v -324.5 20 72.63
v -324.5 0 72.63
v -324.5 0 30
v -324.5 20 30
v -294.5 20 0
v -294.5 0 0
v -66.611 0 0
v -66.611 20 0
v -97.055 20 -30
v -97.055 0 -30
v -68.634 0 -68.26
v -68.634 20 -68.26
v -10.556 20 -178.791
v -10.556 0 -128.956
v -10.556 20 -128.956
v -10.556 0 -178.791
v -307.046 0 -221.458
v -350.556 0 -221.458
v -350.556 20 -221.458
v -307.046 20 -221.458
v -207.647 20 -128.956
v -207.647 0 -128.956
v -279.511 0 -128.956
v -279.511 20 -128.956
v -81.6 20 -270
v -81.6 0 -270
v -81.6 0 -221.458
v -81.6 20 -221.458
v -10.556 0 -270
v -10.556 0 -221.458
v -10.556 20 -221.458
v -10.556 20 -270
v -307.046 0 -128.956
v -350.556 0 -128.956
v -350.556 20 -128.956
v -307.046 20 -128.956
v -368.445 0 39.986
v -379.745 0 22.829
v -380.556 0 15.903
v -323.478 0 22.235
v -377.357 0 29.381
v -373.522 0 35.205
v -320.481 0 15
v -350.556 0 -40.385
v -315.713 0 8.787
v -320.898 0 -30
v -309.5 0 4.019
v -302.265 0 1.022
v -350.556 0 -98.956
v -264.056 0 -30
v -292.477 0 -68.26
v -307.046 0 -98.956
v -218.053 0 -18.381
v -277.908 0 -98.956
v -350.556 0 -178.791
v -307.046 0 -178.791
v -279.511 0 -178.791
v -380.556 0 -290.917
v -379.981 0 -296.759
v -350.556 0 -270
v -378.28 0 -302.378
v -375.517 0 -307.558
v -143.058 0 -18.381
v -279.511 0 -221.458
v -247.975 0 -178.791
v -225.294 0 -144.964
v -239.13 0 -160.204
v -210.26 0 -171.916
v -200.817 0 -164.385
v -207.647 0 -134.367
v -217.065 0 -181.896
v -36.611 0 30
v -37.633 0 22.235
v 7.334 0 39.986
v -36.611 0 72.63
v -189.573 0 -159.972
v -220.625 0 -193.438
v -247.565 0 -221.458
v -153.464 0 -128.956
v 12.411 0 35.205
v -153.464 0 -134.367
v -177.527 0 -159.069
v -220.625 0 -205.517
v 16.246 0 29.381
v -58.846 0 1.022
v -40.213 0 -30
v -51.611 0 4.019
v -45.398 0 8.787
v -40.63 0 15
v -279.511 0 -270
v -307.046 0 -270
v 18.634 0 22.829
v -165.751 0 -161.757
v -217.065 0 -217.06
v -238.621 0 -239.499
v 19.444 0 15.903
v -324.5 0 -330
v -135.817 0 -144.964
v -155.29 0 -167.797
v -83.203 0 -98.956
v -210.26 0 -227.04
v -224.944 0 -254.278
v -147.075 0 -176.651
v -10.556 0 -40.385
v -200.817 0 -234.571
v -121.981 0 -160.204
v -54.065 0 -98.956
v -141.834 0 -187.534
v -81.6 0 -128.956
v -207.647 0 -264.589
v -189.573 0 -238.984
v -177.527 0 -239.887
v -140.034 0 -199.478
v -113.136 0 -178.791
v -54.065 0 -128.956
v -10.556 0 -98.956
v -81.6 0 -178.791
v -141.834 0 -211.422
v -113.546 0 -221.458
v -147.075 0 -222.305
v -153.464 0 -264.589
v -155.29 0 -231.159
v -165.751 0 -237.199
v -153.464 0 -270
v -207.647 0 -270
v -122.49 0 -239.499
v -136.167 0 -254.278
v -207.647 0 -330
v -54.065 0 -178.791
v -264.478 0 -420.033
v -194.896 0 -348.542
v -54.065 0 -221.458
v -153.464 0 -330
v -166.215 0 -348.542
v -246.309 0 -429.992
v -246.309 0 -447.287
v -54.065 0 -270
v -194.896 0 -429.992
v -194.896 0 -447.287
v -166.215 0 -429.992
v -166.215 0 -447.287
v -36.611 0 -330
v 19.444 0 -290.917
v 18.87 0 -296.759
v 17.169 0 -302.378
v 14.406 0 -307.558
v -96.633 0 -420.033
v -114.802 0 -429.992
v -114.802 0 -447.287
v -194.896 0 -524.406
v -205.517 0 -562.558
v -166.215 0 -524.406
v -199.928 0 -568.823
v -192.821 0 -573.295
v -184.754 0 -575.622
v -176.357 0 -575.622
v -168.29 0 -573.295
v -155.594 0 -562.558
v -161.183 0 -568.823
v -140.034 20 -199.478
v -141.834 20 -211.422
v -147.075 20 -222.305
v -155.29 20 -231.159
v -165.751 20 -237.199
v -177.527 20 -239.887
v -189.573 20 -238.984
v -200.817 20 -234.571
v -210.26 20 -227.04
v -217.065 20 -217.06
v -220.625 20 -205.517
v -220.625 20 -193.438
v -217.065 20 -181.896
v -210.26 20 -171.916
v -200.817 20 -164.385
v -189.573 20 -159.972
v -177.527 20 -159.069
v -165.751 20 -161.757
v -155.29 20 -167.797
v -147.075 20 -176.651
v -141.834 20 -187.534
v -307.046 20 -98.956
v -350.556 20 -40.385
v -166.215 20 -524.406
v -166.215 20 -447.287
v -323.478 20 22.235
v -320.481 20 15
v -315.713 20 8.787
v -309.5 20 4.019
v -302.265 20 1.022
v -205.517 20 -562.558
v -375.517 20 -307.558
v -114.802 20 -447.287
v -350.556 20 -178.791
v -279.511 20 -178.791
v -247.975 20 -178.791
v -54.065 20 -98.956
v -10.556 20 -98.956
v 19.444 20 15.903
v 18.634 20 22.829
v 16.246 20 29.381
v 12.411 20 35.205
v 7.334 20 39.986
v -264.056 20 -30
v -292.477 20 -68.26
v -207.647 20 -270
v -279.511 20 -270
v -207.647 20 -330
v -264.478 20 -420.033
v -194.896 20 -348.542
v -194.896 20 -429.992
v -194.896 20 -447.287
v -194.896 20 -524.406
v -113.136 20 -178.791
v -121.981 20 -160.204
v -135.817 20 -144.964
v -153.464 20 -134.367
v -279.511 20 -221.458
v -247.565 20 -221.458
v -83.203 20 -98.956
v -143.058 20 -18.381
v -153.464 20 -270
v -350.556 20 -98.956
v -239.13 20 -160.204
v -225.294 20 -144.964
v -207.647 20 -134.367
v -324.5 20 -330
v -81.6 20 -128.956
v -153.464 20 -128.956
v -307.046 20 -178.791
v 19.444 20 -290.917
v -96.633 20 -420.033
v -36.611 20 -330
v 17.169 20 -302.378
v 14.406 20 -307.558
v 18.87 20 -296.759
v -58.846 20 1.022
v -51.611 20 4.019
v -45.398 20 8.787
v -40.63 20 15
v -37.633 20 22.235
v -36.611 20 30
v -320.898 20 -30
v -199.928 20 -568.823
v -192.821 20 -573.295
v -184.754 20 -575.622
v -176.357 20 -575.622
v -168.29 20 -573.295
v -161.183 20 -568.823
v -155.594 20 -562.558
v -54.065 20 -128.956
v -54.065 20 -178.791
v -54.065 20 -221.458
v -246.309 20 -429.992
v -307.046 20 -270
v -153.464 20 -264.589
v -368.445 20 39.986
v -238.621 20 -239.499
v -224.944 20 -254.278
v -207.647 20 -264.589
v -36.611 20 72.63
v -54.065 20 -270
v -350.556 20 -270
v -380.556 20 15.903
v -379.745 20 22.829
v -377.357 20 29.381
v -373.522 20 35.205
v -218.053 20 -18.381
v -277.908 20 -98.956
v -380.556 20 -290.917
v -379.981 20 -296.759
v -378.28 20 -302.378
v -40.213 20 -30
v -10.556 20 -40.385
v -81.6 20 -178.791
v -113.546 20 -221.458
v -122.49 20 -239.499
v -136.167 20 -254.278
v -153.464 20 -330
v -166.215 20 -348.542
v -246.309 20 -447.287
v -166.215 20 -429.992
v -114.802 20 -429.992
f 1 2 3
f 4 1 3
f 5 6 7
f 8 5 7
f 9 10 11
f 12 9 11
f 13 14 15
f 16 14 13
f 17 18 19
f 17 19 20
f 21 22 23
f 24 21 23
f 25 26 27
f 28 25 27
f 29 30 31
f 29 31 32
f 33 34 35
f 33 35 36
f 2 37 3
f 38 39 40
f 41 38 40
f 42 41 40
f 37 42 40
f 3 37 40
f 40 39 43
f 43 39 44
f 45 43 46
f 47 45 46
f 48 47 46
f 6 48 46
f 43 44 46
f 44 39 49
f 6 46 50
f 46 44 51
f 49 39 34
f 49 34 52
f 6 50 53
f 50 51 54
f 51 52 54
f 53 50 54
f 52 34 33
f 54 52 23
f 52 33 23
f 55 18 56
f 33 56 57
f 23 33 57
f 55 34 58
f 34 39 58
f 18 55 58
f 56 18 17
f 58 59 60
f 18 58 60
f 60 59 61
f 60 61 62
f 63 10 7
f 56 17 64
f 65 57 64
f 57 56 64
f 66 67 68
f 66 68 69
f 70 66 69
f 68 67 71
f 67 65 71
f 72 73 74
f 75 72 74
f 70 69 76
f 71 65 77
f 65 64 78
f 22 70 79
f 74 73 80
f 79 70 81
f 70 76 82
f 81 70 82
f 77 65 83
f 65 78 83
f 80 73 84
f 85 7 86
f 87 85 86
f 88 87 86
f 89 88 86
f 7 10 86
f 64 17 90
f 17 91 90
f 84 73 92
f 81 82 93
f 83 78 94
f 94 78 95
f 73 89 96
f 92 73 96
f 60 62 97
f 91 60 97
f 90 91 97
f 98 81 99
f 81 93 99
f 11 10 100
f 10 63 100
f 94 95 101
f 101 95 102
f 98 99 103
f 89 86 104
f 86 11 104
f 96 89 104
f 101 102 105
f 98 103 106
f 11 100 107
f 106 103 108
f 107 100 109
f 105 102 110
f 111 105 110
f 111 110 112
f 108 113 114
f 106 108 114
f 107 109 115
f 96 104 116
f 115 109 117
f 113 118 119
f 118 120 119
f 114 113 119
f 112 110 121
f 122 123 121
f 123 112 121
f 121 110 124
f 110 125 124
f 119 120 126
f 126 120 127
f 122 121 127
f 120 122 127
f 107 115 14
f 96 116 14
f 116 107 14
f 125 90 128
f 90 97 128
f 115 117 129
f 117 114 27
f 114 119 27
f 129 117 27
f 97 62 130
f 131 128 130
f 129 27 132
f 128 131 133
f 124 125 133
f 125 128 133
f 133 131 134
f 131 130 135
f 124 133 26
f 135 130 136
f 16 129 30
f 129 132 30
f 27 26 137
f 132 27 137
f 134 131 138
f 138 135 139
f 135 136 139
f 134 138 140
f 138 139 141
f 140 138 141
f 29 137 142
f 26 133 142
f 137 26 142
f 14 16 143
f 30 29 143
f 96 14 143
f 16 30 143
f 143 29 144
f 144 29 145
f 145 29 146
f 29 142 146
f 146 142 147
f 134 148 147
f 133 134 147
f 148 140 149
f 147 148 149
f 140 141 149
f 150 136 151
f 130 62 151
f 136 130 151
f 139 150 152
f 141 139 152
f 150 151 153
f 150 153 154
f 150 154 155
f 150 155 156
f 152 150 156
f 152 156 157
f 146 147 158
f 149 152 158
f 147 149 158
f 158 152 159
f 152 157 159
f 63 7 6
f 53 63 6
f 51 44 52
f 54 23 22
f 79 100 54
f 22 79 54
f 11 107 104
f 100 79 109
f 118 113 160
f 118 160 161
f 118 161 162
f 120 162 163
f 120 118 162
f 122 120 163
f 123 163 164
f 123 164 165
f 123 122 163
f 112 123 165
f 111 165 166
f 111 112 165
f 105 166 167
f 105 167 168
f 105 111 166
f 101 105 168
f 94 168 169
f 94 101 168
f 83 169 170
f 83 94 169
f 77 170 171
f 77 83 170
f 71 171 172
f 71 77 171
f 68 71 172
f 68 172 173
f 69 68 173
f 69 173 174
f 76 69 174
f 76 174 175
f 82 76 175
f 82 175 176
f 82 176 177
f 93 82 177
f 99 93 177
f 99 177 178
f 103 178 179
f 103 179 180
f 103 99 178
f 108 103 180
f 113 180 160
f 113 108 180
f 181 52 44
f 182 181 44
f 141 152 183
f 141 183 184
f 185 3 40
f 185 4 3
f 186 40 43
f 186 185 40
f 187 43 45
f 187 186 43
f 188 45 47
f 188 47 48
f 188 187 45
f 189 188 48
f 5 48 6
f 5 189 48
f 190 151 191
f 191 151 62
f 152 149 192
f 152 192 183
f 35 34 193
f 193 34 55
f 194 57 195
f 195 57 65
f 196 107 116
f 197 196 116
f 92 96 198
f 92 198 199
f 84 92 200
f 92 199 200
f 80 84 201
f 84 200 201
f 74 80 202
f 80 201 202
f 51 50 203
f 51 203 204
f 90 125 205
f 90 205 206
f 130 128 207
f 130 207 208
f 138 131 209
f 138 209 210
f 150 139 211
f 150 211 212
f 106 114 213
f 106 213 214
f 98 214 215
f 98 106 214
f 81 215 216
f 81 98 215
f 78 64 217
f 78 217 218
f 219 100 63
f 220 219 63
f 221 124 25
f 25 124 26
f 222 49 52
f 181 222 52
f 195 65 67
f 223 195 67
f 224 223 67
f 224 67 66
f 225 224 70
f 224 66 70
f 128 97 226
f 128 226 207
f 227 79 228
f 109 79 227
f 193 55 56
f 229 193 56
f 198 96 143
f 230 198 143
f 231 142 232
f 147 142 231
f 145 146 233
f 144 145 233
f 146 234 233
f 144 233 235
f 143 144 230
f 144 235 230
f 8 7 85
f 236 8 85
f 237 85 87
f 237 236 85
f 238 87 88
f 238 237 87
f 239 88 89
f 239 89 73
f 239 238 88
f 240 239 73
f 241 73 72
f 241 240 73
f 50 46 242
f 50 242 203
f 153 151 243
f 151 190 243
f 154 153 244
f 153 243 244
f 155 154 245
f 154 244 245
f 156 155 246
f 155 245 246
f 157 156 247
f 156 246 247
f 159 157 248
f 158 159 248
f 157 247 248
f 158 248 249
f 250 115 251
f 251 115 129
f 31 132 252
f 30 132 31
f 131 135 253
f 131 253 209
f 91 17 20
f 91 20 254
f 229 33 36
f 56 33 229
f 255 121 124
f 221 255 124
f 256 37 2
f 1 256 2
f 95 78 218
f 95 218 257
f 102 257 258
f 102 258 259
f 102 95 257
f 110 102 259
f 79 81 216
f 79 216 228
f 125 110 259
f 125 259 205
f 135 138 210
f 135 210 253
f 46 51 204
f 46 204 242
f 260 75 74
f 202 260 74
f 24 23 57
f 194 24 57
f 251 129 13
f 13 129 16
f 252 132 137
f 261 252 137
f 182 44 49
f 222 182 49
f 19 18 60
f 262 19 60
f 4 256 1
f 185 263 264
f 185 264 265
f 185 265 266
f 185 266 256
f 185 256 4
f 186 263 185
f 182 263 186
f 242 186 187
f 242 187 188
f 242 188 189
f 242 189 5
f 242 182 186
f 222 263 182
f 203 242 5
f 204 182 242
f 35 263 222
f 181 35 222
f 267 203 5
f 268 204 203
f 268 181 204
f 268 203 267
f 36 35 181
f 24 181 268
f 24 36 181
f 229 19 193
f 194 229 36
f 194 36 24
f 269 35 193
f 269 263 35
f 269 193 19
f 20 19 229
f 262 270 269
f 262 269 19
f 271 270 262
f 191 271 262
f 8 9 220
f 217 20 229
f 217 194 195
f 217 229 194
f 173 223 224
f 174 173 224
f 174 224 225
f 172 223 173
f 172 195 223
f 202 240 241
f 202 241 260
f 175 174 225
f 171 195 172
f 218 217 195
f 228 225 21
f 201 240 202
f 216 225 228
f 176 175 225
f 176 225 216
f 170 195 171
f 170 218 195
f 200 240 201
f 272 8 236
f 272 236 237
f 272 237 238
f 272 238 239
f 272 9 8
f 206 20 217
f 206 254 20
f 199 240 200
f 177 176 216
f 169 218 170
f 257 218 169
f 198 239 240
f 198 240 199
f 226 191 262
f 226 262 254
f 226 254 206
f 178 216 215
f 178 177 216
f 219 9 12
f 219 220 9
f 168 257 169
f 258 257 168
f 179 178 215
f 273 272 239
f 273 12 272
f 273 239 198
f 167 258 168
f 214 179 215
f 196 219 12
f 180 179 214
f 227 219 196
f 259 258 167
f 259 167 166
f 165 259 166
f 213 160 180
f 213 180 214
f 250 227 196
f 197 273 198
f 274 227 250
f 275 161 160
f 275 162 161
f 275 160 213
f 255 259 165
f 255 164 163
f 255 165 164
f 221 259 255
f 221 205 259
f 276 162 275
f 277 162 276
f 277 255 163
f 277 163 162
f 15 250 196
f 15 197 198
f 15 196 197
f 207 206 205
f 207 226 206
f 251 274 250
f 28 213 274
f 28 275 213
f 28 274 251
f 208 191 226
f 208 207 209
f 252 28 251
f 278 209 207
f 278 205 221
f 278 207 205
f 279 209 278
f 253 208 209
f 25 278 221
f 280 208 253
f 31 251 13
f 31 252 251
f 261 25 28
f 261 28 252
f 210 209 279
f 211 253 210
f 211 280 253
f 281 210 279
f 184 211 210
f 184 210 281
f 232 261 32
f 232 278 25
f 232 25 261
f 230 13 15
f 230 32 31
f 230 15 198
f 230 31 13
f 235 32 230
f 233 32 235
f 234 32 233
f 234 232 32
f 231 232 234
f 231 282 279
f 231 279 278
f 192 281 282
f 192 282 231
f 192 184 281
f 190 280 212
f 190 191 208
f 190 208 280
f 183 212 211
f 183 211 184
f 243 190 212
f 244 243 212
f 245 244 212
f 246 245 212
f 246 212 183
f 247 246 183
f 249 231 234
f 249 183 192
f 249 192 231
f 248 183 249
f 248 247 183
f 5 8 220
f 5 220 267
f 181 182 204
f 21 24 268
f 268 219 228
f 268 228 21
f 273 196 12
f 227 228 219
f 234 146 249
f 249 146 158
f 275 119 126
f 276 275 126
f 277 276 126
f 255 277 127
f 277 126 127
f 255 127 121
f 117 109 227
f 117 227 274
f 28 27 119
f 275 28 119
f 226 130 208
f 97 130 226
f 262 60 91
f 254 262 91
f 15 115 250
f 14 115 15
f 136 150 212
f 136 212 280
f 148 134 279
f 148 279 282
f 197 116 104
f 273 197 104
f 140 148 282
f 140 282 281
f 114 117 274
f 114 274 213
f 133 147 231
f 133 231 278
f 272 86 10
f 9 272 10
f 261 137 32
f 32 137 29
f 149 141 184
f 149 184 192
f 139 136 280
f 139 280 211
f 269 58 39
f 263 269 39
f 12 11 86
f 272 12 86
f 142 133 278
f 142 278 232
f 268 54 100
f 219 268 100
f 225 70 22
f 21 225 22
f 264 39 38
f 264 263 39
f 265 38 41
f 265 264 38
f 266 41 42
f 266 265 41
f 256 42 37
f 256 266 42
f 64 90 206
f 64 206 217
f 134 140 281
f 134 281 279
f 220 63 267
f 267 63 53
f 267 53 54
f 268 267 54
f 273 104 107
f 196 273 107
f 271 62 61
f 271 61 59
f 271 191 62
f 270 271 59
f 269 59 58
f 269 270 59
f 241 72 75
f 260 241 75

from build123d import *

# Parameters (mm, degrees)
SKETCH1_R           = 40.52203667
SKETCH1_W           = 43.509433639
SKETCH1_H           = 49.835103658
SKETCH1_H_2         = 48.542170344
SKETCH1_W_2         = 43.509433638
BOSS_EXTRUDE6_DEPTH = 20
FILLET1_R           = 30
FILLET2_R           = 30


with BuildPart() as part:
    # Sketch1 → Boss-Extrude6 (new body)
    with BuildSketch(Plane(origin=(0, 0, 0), x_dir=(1, 0, 0), z_dir=(0, 1, 0))):
        Polygon((-324.500042801, 0), (-36.61106831, 0), (-36.61106831, -72.630227613), (19.444444444, -30.98937664), (19.444444444, 0), (19.444444444, 300), (-180.555555556, 600), (-380.555555556, 300), (-380.555555556, 0), (-380.555555556, -30.98937664), (-324.500042801, -72.630227613), align=None)
        with Locations((-180.555555556, 199.47796333)):
            Circle(SKETCH1_R, mode=Mode.SUBTRACT)
        Polygon((-350.555555556, 98.955926659), (-307.046121917, 98.955926659), (-350.555555556, 40.384990781), align=None, mode=Mode.SUBTRACT)
        Polygon((-218.052993309, 18.381237109), (-277.907920592, 98.955926659), (-83.203190519, 98.955926659), (-143.058117802, 18.381237109), align=None, mode=Mode.SUBTRACT)
        Polygon((-40.212760909, 30), (-97.055418804, 30), (-68.634089856, 68.259836918), align=None, mode=Mode.SUBTRACT)
        with Locations((-328.800838736, 153.873478488)):
            Rectangle(SKETCH1_W, SKETCH1_H, mode=Mode.SUBTRACT)
        Polygon((-194.895952536, 524.406135398), (-246.308768225, 447.286911864), (-194.895952536, 447.286911864), align=None, mode=Mode.SUBTRACT)
        Polygon((-36.61106831, 330), (-96.633315679, 420.033371054), (-153.463987032, 330), align=None, mode=Mode.SUBTRACT)
        Polygon((-324.500042801, 330), (-207.64712408, 330), (-264.477795432, 420.033371054), align=None, mode=Mode.SUBTRACT)
        Polygon((-10.555555556, 40.384990781), (-54.064989194, 98.955926659), (-10.555555556, 98.955926659), align=None, mode=Mode.SUBTRACT)
        with Locations((-328.800838736, 245.728914828)):
            Rectangle(SKETCH1_W, SKETCH1_H_2, mode=Mode.SUBTRACT)
        with Locations((-32.310272375, 153.873478488)):
            Rectangle(SKETCH1_W_2, SKETCH1_H, mode=Mode.SUBTRACT)
        Polygon((-320.898350202, 30), (-264.055692307, 30), (-292.477021255, 68.259836918), align=None, mode=Mode.SUBTRACT)
        with Locations((-32.310272375, 245.728914828)):
            Rectangle(SKETCH1_W_2, SKETCH1_H_2, mode=Mode.SUBTRACT)
        with BuildLine():
            Line((-279.511482215, 270), (-279.511482215, 221.457829656))
            Line((-279.511482215, 221.457829656), (-247.564832021, 221.457829656))
            ThreePointArc((-247.564832021, 221.457829656), (-232.312774166, 247.379403578), (-207.64712408, 264.58867344))
            Line((-207.64712408, 264.58867344), (-207.64712408, 270))
            Line((-207.64712408, 270), (-279.511482215, 270))
        make_face(mode=Mode.SUBTRACT)
        with BuildLine():
            Line((-279.511482215, 128.955926659), (-279.511482215, 178.791030317))
            Line((-279.511482215, 178.791030317), (-247.975200012, 178.791030317))
            ThreePointArc((-247.975200012, 178.791030317), (-232.771073725, 152.076514844), (-207.64712408, 134.367253219))
            Line((-207.64712408, 134.367253219), (-207.64712408, 128.955926659))
            Line((-207.64712408, 128.955926659), (-279.511482215, 128.955926659))
        make_face(mode=Mode.SUBTRACT)
        with BuildLine():
            Line((-153.463987032, 134.367253219), (-153.463987032, 128.955926659))
            Line((-153.463987032, 128.955926659), (-81.599628896, 128.955926659))
            Line((-81.599628896, 128.955926659), (-81.599628896, 178.791030317))
            Line((-81.599628896, 178.791030317), (-113.135911099, 178.791030317))
            ThreePointArc((-113.135911099, 178.791030317), (-128.340037386, 152.076514844), (-153.463987032, 134.367253219))
        make_face(mode=Mode.SUBTRACT)
        with BuildLine():
            Line((-153.463987032, 264.58867344), (-153.463987032, 270))
            Line((-153.463987032, 270), (-81.599628896, 270))
            Line((-81.599628896, 270), (-81.599628896, 221.457829656))
            Line((-81.599628896, 221.457829656), (-113.54627909, 221.457829656))
            ThreePointArc((-113.54627909, 221.457829656), (-128.798336945, 247.379403578), (-153.463987032, 264.58867344))
        make_face(mode=Mode.SUBTRACT)
        Polygon((-114.802342886, 429.992241235), (-166.215158575, 429.992241235), (-166.215158575, 348.542048906), align=None, mode=Mode.SUBTRACT)
        Polygon((-114.802342886, 447.286911864), (-166.215158575, 524.406135398), (-166.215158575, 447.286911864), align=None, mode=Mode.SUBTRACT)
        Polygon((-246.308768225, 429.992241235), (-194.895952536, 348.542048906), (-194.895952536, 429.992241235), align=None, mode=Mode.SUBTRACT)
    extrude(amount=BOSS_EXTRUDE6_DEPTH)

    # Fillet1
    fillet1_edges = [part.edges().sort_by_distance(p)[0] for p in [
        (-180.555555556, 10, -600),
    ]]
    fillet(fillet1_edges, radius=FILLET1_R)

    # Fillet2
    fillet2_edges = [part.edges().sort_by_distance(p)[0] for p in [
        (19.444444444, 10, 30.98937664),
        (-36.61106831, 10, 0),
        (-324.500042801, 10, 0),
        (-380.555555556, 10, 30.98937664),
        (-380.555555556, 10, -300),
        (19.444444444, 10, -300),
    ]]
    fillet(fillet2_edges, radius=FILLET2_R)


solid = part.part
